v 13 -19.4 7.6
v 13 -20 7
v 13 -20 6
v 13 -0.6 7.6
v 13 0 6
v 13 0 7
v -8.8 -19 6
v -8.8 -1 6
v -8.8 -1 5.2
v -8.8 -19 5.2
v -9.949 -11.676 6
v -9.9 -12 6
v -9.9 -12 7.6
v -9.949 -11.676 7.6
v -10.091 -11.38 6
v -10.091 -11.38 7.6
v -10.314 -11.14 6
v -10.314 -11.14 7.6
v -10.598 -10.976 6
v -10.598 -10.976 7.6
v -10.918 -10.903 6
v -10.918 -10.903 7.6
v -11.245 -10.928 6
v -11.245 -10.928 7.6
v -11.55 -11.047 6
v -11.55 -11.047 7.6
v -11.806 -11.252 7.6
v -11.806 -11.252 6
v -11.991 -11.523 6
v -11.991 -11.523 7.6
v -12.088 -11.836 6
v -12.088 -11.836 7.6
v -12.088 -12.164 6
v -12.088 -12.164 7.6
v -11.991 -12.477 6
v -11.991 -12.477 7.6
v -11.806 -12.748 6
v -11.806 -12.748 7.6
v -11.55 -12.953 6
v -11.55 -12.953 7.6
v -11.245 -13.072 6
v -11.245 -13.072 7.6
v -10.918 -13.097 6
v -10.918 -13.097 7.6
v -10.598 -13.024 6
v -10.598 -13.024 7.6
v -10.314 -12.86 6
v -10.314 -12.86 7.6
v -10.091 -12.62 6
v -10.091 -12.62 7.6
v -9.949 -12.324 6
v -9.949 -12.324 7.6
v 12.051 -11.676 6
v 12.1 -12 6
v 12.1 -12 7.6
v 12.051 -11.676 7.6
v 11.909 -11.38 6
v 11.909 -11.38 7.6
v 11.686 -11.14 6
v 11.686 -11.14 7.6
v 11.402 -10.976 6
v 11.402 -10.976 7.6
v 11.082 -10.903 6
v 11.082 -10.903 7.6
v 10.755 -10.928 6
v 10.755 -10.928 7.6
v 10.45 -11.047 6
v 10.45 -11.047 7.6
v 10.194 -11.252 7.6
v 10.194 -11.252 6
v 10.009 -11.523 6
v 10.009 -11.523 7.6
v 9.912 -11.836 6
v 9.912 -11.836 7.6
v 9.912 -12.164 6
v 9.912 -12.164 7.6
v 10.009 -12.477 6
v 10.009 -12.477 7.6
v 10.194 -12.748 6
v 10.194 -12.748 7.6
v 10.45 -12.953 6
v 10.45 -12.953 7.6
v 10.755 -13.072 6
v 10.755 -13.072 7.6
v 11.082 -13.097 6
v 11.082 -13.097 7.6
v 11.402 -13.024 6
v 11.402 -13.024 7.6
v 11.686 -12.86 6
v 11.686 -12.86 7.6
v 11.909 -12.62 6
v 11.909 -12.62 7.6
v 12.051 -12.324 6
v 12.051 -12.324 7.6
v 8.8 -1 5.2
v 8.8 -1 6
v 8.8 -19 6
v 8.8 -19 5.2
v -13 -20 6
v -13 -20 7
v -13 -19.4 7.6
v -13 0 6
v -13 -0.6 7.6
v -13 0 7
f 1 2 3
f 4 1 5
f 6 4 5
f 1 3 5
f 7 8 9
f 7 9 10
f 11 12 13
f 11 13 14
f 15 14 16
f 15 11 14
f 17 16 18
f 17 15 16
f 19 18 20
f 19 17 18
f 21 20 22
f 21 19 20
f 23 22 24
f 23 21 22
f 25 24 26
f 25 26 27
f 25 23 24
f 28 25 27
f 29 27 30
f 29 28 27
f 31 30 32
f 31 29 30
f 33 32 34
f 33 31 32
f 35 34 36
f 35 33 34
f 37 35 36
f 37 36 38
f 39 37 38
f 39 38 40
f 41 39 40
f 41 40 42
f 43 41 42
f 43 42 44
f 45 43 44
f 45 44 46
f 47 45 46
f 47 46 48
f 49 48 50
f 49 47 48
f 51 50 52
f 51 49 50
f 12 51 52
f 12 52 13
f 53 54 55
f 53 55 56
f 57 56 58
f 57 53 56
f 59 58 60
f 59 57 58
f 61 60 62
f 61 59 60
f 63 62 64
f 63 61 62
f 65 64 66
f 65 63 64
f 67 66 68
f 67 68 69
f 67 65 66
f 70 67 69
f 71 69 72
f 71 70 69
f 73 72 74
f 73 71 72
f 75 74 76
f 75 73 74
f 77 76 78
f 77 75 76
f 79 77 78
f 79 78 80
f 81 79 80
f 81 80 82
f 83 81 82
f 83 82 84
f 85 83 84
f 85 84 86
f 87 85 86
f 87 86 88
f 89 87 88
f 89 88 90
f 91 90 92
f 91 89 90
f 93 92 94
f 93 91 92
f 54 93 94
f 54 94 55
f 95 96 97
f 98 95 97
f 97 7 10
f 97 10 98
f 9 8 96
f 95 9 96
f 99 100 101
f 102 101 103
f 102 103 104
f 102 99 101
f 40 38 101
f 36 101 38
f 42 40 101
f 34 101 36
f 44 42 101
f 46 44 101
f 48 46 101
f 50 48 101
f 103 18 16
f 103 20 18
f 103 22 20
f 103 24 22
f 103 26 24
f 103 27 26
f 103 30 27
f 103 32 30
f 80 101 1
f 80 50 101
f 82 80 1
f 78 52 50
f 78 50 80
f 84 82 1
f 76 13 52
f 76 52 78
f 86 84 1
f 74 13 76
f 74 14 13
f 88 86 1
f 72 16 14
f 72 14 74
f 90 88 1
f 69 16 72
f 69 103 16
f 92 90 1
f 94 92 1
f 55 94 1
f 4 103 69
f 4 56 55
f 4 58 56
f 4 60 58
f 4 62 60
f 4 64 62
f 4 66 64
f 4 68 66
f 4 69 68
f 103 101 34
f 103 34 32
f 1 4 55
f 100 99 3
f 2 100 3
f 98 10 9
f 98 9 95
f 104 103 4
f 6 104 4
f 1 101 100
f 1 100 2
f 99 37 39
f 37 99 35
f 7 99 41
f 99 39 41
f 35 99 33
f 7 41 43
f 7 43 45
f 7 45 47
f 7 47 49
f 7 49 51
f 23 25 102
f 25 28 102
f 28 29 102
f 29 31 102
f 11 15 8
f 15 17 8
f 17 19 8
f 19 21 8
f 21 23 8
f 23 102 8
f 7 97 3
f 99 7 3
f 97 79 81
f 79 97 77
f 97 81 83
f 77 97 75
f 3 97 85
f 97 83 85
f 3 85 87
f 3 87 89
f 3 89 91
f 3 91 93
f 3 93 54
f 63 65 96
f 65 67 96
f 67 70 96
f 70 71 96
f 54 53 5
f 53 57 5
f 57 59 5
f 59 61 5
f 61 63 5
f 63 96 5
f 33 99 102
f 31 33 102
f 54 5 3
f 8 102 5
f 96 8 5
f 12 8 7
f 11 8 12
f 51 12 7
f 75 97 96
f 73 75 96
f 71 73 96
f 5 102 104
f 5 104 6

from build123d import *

# Parameters (mm, degrees)
SKETCH018_W  = 26
SKETCH018_H  = 20
SKETCH018_R  = 1.1
PAD011_DEPTH = 1.6
SKETCH019_W  = 17.6
SKETCH019_H  = 18
PAD012_DEPTH = 0.8
CHAMFER_SIZE = 0.6


with BuildPart() as part:
    # Sketch018 → Pad011 (new body)
    with BuildSketch(Plane.XY):
        Rectangle(SKETCH018_W, SKETCH018_H)
        with Locations((-11, -2)):
            Circle(SKETCH018_R, mode=Mode.SUBTRACT)
        with Locations((11, -2)):
            Circle(SKETCH018_R, mode=Mode.SUBTRACT)
    extrude(amount=PAD011_DEPTH)

    # Sketch019 (on Face7 of Pad011) → Pad012 (join)
    with BuildSketch(Plane(origin=(0, 0, 0), x_dir=(1, 0, 0), z_dir=(0, 0, -1))):
        Rectangle(SKETCH019_W, SKETCH019_H)
    extrude(amount=PAD012_DEPTH)

    # Chamfer
    chamfer_edges = [part.edges().sort_by_distance(p)[0] for p in [
        (0, -10, 1.6),
        (0, 10, 1.6),
    ]]
    chamfer(chamfer_edges, length=CHAMFER_SIZE)


with BuildPart() as part_1:
    # Body005 placement: moved
    add(part.part.moved(Location((0, -10, 6))))


solid = part_1.part
